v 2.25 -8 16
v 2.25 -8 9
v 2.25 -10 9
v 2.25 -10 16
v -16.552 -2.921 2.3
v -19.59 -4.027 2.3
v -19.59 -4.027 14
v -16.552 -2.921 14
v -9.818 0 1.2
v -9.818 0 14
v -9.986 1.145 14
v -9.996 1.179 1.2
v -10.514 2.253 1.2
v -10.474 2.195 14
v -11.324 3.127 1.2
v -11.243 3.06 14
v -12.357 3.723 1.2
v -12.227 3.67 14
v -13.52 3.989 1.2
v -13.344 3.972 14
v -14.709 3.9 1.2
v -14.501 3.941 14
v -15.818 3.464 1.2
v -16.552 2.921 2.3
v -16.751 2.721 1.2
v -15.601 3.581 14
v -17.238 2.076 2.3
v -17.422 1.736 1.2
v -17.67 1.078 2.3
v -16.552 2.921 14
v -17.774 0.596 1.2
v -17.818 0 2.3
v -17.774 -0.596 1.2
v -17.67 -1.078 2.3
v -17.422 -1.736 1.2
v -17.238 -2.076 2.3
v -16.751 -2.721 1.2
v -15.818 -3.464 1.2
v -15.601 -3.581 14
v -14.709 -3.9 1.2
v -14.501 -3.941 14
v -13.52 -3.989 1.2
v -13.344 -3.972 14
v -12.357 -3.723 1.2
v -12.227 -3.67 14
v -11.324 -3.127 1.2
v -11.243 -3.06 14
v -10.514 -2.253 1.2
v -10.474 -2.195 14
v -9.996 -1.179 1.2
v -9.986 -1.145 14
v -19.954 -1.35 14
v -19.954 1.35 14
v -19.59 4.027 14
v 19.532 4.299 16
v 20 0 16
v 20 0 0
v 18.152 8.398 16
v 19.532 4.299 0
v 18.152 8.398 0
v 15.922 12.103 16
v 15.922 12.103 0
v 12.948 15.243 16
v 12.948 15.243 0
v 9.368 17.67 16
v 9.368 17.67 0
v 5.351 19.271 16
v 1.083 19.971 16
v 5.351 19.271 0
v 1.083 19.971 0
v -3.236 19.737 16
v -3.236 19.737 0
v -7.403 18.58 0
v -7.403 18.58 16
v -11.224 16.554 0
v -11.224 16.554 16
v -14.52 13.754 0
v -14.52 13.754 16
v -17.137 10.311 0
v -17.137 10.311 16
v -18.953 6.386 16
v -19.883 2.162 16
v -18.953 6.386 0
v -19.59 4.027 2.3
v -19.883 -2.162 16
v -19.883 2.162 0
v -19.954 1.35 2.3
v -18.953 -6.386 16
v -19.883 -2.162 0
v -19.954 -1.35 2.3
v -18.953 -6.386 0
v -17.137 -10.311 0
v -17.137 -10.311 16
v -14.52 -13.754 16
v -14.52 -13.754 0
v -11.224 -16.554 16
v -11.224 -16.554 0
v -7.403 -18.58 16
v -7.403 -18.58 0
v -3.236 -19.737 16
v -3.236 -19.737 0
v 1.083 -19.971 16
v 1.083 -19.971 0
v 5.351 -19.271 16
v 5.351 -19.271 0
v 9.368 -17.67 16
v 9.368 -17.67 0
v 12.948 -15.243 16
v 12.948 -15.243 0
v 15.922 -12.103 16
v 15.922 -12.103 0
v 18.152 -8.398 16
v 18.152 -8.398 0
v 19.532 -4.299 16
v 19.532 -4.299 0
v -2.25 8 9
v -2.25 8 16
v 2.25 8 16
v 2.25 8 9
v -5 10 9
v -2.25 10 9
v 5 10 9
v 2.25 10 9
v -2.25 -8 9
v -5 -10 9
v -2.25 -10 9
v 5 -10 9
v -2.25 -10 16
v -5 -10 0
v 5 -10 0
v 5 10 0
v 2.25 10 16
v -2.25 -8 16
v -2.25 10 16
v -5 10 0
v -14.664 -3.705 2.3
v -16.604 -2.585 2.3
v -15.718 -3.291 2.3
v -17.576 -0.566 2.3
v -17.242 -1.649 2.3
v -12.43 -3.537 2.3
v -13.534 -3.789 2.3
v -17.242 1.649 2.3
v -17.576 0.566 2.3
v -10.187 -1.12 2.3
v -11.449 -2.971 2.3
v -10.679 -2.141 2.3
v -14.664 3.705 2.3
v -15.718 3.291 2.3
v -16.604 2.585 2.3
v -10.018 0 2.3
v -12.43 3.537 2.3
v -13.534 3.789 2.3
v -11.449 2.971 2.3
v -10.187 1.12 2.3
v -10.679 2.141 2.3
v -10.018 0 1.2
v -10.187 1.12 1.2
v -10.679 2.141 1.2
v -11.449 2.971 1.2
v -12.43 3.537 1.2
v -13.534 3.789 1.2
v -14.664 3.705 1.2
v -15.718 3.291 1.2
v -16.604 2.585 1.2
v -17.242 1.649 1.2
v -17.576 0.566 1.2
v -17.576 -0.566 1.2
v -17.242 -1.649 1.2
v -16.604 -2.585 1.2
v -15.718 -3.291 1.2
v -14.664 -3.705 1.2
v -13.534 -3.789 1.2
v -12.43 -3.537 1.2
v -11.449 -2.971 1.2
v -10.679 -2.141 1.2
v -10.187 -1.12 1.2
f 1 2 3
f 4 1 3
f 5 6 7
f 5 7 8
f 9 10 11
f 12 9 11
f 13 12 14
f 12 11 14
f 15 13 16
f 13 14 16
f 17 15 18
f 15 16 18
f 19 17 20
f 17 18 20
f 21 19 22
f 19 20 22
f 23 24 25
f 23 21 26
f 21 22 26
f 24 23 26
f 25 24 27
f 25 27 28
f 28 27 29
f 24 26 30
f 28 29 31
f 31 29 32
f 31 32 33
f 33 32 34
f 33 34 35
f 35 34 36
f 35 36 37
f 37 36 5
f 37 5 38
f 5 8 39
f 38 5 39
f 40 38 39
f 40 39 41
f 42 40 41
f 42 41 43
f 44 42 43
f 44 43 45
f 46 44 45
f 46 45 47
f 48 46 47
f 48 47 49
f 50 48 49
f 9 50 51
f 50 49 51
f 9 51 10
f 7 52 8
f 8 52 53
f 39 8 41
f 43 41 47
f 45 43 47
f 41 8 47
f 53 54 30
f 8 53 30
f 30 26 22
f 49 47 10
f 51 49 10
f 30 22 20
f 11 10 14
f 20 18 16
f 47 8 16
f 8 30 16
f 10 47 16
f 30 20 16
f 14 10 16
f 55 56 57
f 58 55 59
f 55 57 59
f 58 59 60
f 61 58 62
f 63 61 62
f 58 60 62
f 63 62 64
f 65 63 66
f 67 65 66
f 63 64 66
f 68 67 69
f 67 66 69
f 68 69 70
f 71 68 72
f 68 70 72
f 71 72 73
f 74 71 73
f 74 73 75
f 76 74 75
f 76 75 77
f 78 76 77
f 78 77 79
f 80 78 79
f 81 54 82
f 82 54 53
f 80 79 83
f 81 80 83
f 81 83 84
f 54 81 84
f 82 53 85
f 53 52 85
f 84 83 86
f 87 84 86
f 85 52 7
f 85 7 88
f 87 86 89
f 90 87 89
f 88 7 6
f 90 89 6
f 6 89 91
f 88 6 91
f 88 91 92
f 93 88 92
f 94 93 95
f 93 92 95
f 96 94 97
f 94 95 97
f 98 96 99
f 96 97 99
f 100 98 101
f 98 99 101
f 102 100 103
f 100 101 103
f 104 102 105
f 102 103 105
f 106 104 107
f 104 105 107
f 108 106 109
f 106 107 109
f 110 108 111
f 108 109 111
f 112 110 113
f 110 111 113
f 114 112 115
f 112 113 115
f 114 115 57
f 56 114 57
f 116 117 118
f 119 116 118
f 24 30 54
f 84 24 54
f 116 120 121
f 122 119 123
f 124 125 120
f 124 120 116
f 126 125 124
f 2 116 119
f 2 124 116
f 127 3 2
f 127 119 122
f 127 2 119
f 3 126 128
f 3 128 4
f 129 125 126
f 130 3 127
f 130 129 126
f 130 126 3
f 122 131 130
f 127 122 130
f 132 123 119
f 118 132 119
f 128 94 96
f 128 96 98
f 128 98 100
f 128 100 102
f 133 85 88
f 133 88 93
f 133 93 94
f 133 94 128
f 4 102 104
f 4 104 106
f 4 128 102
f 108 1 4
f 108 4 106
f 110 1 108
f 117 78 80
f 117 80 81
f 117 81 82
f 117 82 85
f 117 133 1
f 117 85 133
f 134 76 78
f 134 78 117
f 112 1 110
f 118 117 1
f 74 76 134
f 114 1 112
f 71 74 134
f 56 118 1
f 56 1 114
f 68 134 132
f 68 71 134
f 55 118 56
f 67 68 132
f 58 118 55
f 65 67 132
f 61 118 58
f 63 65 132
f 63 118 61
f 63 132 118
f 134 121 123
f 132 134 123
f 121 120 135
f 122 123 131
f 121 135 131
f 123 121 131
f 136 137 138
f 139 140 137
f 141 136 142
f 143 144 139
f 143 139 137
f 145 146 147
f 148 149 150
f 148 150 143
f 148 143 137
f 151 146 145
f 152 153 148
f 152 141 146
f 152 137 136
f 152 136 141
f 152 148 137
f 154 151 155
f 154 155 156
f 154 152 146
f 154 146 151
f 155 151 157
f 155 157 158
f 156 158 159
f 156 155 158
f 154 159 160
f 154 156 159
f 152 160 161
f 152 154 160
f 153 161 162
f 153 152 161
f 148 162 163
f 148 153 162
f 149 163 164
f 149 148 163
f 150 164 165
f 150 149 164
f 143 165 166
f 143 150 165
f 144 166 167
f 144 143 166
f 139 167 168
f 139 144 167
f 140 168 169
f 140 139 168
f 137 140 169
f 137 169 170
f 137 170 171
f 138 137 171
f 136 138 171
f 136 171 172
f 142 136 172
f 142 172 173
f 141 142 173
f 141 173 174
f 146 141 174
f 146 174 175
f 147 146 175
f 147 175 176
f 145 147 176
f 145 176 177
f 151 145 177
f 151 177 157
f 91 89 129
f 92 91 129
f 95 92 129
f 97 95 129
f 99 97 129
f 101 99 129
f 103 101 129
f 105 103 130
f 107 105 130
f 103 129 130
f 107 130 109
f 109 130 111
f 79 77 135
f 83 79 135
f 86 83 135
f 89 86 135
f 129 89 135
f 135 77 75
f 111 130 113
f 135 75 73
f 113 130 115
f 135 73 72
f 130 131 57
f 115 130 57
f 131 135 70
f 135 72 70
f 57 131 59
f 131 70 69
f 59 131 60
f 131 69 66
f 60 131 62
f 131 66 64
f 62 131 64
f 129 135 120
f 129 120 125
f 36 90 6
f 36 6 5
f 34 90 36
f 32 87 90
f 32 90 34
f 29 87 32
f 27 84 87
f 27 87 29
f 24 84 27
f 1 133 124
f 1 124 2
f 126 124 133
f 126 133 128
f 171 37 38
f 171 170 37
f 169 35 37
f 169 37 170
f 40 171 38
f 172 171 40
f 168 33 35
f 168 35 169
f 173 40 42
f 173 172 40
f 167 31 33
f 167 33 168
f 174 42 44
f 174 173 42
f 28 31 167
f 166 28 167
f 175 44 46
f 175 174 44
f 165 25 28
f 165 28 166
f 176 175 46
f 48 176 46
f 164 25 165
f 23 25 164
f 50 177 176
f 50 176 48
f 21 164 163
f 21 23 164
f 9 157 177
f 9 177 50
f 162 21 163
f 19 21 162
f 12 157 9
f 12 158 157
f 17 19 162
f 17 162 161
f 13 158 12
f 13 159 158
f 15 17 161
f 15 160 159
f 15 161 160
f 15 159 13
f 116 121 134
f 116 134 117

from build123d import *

# Parameters (mm, degrees)
F0_R      = 20
F1_DEPTH  = 16
F2_W      = 10
F2_H      = 20
F3_DEPTH  = 9
F4_W      = 4.5
F4_H      = 2
F5_DEPTH  = 7.001
F7_R      = 4
F7_R_2    = 3.8
F8_DEPTH  = 12.8
F10_DEPTH = 11.7


with BuildPart() as f1:
    # F0 (on Top) → F1 (new body)
    with BuildSketch(Plane.XY):
        Circle(F0_R)
    extrude(amount=F1_DEPTH)

    # F2 (on face) → F3 (cut)
    with BuildSketch(Plane(origin=(0, 0, 0), x_dir=(1, 0, 0), z_dir=(0, 0, -1))):
        Rectangle(F2_W, F2_H)
    extrude(amount=-F3_DEPTH, mode=Mode.SUBTRACT)

    # F4 (on face) → F5 (cut, through all)
    with BuildSketch(Plane(origin=(0, 0, 9), x_dir=(1, 0, 0), z_dir=(0, 0, -1))):
        with Locations((0, 9)):
            Rectangle(F4_W, F4_H)
        with Locations((0, -9)):
            Rectangle(F4_W, F4_H)
    extrude(amount=-F5_DEPTH, mode=Mode.SUBTRACT)

    # F7 (on offset) → F8 (cut)
    with BuildSketch(Plane.XY.offset(14)):
        with Locations((-13.818456, 0)):
            Circle(F7_R)
        with Locations((-13.818456, 0)):
            Circle(F7_R_2, mode=Mode.SUBTRACT)
    extrude(amount=-F8_DEPTH, mode=Mode.SUBTRACT)

    # F9 (on offset) → F10 (cut)
    with BuildSketch(Plane.XY.offset(14)):
        with BuildLine():
            Line((-26.818456, -6.657433), (-16.5516, -2.920603))
            ThreePointArc((-16.5516, -2.920603), (-9.818456, 0), (-16.5516, 2.920603))
            Line((-16.5516, 2.920603), (-26.818456, 6.657433))
            Line((-26.818456, 6.657433), (-26.818456, 0))
            Line((-26.818456, 0), (-26.818456, -6.657433))
        make_face()
    extrude(amount=-F10_DEPTH, mode=Mode.SUBTRACT)


solid = f1.part
